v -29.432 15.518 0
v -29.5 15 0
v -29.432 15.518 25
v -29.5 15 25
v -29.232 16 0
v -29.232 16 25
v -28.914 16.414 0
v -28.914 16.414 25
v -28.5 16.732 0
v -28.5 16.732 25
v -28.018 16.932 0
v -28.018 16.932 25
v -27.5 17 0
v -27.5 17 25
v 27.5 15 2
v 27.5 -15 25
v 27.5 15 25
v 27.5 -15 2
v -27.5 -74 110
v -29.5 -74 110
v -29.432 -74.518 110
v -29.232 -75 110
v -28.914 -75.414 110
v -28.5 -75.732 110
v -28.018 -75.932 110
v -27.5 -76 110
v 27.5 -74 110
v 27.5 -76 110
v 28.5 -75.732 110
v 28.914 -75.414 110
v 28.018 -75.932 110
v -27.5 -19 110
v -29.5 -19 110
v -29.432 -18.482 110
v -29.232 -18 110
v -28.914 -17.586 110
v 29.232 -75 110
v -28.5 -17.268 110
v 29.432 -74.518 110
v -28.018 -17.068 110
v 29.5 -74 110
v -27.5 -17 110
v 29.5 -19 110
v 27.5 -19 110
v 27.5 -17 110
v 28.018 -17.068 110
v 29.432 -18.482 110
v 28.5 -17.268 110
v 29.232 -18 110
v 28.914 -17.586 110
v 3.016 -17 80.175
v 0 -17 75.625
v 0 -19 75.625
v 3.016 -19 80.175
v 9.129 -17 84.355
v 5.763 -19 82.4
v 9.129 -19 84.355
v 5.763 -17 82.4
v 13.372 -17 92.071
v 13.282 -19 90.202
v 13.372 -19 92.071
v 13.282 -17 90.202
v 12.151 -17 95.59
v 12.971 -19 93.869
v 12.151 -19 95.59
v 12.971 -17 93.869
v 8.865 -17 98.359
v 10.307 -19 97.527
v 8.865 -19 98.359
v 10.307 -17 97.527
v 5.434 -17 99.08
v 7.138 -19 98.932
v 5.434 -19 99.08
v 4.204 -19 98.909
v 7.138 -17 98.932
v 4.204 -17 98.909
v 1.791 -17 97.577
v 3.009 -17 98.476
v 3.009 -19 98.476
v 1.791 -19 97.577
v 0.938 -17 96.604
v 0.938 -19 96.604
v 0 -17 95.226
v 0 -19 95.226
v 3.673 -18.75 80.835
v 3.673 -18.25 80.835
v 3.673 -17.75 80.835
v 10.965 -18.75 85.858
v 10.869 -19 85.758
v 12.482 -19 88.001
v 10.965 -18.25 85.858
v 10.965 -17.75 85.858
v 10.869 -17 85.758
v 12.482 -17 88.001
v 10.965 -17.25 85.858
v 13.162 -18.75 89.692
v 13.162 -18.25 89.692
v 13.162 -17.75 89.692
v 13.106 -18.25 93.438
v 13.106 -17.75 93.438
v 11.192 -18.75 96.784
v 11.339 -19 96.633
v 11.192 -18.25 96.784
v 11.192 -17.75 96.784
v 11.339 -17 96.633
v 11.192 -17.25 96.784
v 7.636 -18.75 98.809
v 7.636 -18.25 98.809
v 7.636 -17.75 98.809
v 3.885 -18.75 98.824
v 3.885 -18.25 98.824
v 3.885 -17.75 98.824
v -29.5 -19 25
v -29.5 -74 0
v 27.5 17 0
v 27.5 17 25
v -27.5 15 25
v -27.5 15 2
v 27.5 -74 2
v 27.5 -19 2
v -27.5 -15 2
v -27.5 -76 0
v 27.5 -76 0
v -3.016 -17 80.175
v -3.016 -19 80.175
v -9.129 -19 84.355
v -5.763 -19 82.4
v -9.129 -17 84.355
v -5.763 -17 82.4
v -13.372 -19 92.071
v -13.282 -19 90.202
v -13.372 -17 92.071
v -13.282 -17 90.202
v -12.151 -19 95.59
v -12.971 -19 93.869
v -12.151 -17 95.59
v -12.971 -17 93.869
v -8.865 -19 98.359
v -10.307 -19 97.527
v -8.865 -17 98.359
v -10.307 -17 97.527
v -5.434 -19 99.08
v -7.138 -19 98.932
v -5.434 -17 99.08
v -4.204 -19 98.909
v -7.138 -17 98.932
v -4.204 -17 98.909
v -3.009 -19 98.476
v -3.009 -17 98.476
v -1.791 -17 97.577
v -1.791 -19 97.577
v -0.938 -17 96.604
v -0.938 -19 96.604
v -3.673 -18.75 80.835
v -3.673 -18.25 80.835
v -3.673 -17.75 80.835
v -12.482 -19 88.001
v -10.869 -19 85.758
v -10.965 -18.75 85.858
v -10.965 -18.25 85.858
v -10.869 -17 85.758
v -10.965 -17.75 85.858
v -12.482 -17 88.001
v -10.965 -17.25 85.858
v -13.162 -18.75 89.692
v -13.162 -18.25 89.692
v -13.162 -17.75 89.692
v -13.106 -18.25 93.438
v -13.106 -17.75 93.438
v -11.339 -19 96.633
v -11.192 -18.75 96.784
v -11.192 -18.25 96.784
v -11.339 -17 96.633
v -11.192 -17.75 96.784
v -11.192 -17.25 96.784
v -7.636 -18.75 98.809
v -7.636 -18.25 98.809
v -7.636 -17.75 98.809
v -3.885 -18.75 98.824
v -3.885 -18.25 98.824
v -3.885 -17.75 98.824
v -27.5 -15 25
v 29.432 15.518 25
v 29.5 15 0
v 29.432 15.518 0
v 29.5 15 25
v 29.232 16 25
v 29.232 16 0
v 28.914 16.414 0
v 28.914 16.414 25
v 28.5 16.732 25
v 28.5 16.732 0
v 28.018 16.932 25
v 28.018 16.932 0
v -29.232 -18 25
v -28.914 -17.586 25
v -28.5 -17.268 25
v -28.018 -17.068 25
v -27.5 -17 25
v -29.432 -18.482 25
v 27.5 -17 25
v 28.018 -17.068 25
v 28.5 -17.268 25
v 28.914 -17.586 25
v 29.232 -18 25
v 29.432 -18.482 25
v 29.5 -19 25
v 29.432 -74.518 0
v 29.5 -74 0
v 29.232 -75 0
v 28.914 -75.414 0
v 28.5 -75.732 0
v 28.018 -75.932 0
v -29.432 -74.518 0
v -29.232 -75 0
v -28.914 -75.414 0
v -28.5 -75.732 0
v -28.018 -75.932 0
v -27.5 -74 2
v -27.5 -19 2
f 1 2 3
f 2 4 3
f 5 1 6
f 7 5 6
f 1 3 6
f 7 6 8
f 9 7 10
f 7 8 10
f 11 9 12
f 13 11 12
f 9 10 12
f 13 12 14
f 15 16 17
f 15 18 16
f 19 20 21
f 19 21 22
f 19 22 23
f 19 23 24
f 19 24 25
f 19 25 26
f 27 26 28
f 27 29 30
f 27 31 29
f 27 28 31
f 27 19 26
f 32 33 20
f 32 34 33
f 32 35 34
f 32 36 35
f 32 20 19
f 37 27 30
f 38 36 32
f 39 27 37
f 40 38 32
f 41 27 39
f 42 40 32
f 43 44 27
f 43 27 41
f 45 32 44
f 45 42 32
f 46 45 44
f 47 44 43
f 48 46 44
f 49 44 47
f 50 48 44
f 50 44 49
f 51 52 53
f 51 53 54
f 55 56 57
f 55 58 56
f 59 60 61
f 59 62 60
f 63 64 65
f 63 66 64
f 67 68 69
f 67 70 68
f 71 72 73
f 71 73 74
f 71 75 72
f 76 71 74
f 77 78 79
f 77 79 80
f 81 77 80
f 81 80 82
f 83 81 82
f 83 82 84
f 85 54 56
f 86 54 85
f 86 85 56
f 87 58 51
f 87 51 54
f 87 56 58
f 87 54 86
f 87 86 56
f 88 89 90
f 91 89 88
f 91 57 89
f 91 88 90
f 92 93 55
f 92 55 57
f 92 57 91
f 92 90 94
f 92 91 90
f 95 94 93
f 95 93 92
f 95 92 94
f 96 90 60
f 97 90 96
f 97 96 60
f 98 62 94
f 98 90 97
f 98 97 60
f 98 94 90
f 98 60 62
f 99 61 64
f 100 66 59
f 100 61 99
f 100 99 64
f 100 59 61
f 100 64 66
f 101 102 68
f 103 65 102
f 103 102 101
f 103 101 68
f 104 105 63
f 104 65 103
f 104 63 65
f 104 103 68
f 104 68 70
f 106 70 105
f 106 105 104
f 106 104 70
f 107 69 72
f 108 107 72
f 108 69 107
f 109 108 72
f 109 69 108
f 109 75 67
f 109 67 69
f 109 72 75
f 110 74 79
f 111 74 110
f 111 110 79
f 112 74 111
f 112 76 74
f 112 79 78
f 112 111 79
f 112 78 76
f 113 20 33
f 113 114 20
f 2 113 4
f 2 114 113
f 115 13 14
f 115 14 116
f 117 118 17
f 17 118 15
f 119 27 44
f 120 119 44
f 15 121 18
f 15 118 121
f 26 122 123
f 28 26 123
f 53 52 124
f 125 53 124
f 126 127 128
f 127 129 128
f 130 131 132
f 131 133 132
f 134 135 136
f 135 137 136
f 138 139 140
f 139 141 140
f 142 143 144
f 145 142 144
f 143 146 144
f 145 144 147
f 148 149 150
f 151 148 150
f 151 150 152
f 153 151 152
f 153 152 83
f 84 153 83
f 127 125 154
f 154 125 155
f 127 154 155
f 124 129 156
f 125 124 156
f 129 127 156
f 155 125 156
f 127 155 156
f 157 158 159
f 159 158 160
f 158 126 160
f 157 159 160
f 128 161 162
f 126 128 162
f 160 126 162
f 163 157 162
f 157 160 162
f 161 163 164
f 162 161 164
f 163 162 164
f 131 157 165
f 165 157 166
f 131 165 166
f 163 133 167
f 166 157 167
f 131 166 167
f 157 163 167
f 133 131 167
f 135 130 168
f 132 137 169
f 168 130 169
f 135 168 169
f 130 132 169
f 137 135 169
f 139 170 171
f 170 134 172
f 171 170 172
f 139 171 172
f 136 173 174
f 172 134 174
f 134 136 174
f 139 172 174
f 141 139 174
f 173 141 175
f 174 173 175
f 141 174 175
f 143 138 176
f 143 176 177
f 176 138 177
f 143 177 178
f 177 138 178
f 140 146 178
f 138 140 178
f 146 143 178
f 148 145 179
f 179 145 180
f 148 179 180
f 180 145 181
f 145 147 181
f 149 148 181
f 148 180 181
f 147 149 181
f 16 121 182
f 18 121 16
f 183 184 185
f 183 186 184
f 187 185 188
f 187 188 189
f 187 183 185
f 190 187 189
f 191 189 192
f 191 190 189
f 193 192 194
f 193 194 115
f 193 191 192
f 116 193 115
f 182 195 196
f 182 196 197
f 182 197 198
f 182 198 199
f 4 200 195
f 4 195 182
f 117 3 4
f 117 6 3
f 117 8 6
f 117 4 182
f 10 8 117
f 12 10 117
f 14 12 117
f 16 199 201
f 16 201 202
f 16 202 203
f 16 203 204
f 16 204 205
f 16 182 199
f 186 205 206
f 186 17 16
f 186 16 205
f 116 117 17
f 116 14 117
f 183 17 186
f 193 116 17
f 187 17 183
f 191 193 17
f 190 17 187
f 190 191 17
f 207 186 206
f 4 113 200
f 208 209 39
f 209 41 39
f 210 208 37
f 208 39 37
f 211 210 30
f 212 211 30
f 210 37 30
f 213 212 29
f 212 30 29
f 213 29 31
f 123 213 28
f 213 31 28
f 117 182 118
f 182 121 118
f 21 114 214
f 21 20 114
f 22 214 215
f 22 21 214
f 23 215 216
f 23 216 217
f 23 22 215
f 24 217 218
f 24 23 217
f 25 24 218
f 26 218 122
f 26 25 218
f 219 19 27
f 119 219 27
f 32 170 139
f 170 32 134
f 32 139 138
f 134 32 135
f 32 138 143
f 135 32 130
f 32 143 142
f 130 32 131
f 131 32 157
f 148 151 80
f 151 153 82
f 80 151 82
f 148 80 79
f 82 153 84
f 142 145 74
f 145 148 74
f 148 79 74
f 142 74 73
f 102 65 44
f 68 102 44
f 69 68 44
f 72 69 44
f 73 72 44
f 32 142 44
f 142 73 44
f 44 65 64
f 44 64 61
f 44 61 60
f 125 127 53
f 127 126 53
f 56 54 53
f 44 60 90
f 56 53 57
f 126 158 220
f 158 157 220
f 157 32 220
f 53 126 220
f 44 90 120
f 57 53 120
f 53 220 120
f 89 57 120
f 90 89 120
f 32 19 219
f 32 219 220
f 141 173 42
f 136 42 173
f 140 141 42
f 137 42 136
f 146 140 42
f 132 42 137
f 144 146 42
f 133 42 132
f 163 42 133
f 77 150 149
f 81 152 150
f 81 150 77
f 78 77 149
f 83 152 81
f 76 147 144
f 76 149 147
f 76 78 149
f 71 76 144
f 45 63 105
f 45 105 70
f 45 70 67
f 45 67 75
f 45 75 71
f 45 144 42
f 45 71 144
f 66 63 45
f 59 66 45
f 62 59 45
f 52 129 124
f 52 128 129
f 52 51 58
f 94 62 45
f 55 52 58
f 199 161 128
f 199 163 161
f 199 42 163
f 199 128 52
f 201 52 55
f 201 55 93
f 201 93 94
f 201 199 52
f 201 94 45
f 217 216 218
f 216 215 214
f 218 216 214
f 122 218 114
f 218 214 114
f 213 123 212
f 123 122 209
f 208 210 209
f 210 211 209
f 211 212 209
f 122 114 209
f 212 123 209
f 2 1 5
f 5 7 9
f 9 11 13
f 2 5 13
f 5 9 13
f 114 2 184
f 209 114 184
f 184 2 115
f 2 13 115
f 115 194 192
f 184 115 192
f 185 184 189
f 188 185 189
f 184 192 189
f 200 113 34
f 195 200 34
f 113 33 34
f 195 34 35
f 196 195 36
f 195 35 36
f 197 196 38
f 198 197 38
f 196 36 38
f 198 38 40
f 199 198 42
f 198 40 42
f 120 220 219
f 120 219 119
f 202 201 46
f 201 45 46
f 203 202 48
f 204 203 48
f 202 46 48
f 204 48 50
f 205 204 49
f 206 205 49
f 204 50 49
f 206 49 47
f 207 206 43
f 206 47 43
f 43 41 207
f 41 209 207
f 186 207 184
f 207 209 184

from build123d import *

# Parameters (mm, degrees)
SKETCH_W       = 59
SKETCH_H       = 34
PAD_DEPTH      = 25
THICKNESS_T    = -2
SKETCH002_W    = 59
SKETCH002_H    = 59
PAD001_DEPTH   = 110
THICKNESS001_T = -2
FILLET_R       = 2
FILLET001_R    = 2
POCKET_DEPTH   = 2


with BuildPart() as body:
    # Sketch → Pad (new body)
    with BuildSketch(Plane.XY):
        Rectangle(SKETCH_W, SKETCH_H)
    extrude(amount=PAD_DEPTH)

    # Thickness
    thickness_openings = [body.faces().sort_by_distance(p)[0] for p in [
        (0, 0, 25),
    ]]
    offset(amount=THICKNESS_T, openings=thickness_openings)


with BuildPart() as body001:
    # Sketch002 → Pad001 (new body)
    with BuildSketch(Plane.XY):
        with Locations((0, -46.5)):
            Rectangle(SKETCH002_W, SKETCH002_H)
    extrude(amount=PAD001_DEPTH)

    # Thickness001
    thickness001_openings = [body001.faces().sort_by_distance(p)[0] for p in [
        (0, -46.5, 110),
    ]]
    offset(amount=THICKNESS001_T, openings=thickness001_openings)

    # Boolean: union Body
    add(body.part)

    # Fillet
    fillet_edges = [body001.edges().sort_by_distance(p)[0] for p in [
        (29.5, -76, 55),
        (29.5, 17, 12.5),
        (-29.5, -76, 55),
        (-29.5, 17, 12.5),
    ]]
    fillet(fillet_edges, radius=FILLET_R)

    # Fillet001
    fillet001_edges = [body001.edges().sort_by_distance(p)[0] for p in [
        (29.5, -17, 67.5),
        (-29.5, -17, 67.5),
    ]]
    fillet(fillet001_edges, radius=FILLET001_R)

    # Sketch003 → Pocket (cut)
    with BuildSketch(Plane(origin=(0, -17, 0), x_dir=(-1, 0, 0), z_dir=(0, 1, 0))):
        with BuildLine():
            add(Edge.make_bspline(
                [(0, 75.6251), (-2.511254, 80.679903), (-7.485486, 83.314581), (-11.174629, 85.509438), (-13.605908, 89.797189), (-13.37285, 93.451754), (-11.541057, 97.022131), (-7.614382, 99.161534), (-3.819055, 99.187138), (-1.554081, 97.750555), (0, 95.2257)],
                knots=[0, 0, 0, 0, 0.125, 0.25, 0.375, 0.5, 0.625, 0.75, 0.875, 1, 1, 1, 1], degree=3))
            add(Edge.make_bspline(
                [(0, 75.6251), (2.511254, 80.679903), (7.485486, 83.314581), (11.174629, 85.509438), (13.605908, 89.797189), (13.37285, 93.451754), (11.541057, 97.022131), (7.614382, 99.161534), (3.819055, 99.187138), (1.554081, 97.750555), (0, 95.2257)],
                knots=[0, 0, 0, 0, 0.125, 0.25, 0.375, 0.5, 0.625, 0.75, 0.875, 1, 1, 1, 1], degree=3))
        make_face()
    extrude(amount=-POCKET_DEPTH, mode=Mode.SUBTRACT)


solid = body001.part
